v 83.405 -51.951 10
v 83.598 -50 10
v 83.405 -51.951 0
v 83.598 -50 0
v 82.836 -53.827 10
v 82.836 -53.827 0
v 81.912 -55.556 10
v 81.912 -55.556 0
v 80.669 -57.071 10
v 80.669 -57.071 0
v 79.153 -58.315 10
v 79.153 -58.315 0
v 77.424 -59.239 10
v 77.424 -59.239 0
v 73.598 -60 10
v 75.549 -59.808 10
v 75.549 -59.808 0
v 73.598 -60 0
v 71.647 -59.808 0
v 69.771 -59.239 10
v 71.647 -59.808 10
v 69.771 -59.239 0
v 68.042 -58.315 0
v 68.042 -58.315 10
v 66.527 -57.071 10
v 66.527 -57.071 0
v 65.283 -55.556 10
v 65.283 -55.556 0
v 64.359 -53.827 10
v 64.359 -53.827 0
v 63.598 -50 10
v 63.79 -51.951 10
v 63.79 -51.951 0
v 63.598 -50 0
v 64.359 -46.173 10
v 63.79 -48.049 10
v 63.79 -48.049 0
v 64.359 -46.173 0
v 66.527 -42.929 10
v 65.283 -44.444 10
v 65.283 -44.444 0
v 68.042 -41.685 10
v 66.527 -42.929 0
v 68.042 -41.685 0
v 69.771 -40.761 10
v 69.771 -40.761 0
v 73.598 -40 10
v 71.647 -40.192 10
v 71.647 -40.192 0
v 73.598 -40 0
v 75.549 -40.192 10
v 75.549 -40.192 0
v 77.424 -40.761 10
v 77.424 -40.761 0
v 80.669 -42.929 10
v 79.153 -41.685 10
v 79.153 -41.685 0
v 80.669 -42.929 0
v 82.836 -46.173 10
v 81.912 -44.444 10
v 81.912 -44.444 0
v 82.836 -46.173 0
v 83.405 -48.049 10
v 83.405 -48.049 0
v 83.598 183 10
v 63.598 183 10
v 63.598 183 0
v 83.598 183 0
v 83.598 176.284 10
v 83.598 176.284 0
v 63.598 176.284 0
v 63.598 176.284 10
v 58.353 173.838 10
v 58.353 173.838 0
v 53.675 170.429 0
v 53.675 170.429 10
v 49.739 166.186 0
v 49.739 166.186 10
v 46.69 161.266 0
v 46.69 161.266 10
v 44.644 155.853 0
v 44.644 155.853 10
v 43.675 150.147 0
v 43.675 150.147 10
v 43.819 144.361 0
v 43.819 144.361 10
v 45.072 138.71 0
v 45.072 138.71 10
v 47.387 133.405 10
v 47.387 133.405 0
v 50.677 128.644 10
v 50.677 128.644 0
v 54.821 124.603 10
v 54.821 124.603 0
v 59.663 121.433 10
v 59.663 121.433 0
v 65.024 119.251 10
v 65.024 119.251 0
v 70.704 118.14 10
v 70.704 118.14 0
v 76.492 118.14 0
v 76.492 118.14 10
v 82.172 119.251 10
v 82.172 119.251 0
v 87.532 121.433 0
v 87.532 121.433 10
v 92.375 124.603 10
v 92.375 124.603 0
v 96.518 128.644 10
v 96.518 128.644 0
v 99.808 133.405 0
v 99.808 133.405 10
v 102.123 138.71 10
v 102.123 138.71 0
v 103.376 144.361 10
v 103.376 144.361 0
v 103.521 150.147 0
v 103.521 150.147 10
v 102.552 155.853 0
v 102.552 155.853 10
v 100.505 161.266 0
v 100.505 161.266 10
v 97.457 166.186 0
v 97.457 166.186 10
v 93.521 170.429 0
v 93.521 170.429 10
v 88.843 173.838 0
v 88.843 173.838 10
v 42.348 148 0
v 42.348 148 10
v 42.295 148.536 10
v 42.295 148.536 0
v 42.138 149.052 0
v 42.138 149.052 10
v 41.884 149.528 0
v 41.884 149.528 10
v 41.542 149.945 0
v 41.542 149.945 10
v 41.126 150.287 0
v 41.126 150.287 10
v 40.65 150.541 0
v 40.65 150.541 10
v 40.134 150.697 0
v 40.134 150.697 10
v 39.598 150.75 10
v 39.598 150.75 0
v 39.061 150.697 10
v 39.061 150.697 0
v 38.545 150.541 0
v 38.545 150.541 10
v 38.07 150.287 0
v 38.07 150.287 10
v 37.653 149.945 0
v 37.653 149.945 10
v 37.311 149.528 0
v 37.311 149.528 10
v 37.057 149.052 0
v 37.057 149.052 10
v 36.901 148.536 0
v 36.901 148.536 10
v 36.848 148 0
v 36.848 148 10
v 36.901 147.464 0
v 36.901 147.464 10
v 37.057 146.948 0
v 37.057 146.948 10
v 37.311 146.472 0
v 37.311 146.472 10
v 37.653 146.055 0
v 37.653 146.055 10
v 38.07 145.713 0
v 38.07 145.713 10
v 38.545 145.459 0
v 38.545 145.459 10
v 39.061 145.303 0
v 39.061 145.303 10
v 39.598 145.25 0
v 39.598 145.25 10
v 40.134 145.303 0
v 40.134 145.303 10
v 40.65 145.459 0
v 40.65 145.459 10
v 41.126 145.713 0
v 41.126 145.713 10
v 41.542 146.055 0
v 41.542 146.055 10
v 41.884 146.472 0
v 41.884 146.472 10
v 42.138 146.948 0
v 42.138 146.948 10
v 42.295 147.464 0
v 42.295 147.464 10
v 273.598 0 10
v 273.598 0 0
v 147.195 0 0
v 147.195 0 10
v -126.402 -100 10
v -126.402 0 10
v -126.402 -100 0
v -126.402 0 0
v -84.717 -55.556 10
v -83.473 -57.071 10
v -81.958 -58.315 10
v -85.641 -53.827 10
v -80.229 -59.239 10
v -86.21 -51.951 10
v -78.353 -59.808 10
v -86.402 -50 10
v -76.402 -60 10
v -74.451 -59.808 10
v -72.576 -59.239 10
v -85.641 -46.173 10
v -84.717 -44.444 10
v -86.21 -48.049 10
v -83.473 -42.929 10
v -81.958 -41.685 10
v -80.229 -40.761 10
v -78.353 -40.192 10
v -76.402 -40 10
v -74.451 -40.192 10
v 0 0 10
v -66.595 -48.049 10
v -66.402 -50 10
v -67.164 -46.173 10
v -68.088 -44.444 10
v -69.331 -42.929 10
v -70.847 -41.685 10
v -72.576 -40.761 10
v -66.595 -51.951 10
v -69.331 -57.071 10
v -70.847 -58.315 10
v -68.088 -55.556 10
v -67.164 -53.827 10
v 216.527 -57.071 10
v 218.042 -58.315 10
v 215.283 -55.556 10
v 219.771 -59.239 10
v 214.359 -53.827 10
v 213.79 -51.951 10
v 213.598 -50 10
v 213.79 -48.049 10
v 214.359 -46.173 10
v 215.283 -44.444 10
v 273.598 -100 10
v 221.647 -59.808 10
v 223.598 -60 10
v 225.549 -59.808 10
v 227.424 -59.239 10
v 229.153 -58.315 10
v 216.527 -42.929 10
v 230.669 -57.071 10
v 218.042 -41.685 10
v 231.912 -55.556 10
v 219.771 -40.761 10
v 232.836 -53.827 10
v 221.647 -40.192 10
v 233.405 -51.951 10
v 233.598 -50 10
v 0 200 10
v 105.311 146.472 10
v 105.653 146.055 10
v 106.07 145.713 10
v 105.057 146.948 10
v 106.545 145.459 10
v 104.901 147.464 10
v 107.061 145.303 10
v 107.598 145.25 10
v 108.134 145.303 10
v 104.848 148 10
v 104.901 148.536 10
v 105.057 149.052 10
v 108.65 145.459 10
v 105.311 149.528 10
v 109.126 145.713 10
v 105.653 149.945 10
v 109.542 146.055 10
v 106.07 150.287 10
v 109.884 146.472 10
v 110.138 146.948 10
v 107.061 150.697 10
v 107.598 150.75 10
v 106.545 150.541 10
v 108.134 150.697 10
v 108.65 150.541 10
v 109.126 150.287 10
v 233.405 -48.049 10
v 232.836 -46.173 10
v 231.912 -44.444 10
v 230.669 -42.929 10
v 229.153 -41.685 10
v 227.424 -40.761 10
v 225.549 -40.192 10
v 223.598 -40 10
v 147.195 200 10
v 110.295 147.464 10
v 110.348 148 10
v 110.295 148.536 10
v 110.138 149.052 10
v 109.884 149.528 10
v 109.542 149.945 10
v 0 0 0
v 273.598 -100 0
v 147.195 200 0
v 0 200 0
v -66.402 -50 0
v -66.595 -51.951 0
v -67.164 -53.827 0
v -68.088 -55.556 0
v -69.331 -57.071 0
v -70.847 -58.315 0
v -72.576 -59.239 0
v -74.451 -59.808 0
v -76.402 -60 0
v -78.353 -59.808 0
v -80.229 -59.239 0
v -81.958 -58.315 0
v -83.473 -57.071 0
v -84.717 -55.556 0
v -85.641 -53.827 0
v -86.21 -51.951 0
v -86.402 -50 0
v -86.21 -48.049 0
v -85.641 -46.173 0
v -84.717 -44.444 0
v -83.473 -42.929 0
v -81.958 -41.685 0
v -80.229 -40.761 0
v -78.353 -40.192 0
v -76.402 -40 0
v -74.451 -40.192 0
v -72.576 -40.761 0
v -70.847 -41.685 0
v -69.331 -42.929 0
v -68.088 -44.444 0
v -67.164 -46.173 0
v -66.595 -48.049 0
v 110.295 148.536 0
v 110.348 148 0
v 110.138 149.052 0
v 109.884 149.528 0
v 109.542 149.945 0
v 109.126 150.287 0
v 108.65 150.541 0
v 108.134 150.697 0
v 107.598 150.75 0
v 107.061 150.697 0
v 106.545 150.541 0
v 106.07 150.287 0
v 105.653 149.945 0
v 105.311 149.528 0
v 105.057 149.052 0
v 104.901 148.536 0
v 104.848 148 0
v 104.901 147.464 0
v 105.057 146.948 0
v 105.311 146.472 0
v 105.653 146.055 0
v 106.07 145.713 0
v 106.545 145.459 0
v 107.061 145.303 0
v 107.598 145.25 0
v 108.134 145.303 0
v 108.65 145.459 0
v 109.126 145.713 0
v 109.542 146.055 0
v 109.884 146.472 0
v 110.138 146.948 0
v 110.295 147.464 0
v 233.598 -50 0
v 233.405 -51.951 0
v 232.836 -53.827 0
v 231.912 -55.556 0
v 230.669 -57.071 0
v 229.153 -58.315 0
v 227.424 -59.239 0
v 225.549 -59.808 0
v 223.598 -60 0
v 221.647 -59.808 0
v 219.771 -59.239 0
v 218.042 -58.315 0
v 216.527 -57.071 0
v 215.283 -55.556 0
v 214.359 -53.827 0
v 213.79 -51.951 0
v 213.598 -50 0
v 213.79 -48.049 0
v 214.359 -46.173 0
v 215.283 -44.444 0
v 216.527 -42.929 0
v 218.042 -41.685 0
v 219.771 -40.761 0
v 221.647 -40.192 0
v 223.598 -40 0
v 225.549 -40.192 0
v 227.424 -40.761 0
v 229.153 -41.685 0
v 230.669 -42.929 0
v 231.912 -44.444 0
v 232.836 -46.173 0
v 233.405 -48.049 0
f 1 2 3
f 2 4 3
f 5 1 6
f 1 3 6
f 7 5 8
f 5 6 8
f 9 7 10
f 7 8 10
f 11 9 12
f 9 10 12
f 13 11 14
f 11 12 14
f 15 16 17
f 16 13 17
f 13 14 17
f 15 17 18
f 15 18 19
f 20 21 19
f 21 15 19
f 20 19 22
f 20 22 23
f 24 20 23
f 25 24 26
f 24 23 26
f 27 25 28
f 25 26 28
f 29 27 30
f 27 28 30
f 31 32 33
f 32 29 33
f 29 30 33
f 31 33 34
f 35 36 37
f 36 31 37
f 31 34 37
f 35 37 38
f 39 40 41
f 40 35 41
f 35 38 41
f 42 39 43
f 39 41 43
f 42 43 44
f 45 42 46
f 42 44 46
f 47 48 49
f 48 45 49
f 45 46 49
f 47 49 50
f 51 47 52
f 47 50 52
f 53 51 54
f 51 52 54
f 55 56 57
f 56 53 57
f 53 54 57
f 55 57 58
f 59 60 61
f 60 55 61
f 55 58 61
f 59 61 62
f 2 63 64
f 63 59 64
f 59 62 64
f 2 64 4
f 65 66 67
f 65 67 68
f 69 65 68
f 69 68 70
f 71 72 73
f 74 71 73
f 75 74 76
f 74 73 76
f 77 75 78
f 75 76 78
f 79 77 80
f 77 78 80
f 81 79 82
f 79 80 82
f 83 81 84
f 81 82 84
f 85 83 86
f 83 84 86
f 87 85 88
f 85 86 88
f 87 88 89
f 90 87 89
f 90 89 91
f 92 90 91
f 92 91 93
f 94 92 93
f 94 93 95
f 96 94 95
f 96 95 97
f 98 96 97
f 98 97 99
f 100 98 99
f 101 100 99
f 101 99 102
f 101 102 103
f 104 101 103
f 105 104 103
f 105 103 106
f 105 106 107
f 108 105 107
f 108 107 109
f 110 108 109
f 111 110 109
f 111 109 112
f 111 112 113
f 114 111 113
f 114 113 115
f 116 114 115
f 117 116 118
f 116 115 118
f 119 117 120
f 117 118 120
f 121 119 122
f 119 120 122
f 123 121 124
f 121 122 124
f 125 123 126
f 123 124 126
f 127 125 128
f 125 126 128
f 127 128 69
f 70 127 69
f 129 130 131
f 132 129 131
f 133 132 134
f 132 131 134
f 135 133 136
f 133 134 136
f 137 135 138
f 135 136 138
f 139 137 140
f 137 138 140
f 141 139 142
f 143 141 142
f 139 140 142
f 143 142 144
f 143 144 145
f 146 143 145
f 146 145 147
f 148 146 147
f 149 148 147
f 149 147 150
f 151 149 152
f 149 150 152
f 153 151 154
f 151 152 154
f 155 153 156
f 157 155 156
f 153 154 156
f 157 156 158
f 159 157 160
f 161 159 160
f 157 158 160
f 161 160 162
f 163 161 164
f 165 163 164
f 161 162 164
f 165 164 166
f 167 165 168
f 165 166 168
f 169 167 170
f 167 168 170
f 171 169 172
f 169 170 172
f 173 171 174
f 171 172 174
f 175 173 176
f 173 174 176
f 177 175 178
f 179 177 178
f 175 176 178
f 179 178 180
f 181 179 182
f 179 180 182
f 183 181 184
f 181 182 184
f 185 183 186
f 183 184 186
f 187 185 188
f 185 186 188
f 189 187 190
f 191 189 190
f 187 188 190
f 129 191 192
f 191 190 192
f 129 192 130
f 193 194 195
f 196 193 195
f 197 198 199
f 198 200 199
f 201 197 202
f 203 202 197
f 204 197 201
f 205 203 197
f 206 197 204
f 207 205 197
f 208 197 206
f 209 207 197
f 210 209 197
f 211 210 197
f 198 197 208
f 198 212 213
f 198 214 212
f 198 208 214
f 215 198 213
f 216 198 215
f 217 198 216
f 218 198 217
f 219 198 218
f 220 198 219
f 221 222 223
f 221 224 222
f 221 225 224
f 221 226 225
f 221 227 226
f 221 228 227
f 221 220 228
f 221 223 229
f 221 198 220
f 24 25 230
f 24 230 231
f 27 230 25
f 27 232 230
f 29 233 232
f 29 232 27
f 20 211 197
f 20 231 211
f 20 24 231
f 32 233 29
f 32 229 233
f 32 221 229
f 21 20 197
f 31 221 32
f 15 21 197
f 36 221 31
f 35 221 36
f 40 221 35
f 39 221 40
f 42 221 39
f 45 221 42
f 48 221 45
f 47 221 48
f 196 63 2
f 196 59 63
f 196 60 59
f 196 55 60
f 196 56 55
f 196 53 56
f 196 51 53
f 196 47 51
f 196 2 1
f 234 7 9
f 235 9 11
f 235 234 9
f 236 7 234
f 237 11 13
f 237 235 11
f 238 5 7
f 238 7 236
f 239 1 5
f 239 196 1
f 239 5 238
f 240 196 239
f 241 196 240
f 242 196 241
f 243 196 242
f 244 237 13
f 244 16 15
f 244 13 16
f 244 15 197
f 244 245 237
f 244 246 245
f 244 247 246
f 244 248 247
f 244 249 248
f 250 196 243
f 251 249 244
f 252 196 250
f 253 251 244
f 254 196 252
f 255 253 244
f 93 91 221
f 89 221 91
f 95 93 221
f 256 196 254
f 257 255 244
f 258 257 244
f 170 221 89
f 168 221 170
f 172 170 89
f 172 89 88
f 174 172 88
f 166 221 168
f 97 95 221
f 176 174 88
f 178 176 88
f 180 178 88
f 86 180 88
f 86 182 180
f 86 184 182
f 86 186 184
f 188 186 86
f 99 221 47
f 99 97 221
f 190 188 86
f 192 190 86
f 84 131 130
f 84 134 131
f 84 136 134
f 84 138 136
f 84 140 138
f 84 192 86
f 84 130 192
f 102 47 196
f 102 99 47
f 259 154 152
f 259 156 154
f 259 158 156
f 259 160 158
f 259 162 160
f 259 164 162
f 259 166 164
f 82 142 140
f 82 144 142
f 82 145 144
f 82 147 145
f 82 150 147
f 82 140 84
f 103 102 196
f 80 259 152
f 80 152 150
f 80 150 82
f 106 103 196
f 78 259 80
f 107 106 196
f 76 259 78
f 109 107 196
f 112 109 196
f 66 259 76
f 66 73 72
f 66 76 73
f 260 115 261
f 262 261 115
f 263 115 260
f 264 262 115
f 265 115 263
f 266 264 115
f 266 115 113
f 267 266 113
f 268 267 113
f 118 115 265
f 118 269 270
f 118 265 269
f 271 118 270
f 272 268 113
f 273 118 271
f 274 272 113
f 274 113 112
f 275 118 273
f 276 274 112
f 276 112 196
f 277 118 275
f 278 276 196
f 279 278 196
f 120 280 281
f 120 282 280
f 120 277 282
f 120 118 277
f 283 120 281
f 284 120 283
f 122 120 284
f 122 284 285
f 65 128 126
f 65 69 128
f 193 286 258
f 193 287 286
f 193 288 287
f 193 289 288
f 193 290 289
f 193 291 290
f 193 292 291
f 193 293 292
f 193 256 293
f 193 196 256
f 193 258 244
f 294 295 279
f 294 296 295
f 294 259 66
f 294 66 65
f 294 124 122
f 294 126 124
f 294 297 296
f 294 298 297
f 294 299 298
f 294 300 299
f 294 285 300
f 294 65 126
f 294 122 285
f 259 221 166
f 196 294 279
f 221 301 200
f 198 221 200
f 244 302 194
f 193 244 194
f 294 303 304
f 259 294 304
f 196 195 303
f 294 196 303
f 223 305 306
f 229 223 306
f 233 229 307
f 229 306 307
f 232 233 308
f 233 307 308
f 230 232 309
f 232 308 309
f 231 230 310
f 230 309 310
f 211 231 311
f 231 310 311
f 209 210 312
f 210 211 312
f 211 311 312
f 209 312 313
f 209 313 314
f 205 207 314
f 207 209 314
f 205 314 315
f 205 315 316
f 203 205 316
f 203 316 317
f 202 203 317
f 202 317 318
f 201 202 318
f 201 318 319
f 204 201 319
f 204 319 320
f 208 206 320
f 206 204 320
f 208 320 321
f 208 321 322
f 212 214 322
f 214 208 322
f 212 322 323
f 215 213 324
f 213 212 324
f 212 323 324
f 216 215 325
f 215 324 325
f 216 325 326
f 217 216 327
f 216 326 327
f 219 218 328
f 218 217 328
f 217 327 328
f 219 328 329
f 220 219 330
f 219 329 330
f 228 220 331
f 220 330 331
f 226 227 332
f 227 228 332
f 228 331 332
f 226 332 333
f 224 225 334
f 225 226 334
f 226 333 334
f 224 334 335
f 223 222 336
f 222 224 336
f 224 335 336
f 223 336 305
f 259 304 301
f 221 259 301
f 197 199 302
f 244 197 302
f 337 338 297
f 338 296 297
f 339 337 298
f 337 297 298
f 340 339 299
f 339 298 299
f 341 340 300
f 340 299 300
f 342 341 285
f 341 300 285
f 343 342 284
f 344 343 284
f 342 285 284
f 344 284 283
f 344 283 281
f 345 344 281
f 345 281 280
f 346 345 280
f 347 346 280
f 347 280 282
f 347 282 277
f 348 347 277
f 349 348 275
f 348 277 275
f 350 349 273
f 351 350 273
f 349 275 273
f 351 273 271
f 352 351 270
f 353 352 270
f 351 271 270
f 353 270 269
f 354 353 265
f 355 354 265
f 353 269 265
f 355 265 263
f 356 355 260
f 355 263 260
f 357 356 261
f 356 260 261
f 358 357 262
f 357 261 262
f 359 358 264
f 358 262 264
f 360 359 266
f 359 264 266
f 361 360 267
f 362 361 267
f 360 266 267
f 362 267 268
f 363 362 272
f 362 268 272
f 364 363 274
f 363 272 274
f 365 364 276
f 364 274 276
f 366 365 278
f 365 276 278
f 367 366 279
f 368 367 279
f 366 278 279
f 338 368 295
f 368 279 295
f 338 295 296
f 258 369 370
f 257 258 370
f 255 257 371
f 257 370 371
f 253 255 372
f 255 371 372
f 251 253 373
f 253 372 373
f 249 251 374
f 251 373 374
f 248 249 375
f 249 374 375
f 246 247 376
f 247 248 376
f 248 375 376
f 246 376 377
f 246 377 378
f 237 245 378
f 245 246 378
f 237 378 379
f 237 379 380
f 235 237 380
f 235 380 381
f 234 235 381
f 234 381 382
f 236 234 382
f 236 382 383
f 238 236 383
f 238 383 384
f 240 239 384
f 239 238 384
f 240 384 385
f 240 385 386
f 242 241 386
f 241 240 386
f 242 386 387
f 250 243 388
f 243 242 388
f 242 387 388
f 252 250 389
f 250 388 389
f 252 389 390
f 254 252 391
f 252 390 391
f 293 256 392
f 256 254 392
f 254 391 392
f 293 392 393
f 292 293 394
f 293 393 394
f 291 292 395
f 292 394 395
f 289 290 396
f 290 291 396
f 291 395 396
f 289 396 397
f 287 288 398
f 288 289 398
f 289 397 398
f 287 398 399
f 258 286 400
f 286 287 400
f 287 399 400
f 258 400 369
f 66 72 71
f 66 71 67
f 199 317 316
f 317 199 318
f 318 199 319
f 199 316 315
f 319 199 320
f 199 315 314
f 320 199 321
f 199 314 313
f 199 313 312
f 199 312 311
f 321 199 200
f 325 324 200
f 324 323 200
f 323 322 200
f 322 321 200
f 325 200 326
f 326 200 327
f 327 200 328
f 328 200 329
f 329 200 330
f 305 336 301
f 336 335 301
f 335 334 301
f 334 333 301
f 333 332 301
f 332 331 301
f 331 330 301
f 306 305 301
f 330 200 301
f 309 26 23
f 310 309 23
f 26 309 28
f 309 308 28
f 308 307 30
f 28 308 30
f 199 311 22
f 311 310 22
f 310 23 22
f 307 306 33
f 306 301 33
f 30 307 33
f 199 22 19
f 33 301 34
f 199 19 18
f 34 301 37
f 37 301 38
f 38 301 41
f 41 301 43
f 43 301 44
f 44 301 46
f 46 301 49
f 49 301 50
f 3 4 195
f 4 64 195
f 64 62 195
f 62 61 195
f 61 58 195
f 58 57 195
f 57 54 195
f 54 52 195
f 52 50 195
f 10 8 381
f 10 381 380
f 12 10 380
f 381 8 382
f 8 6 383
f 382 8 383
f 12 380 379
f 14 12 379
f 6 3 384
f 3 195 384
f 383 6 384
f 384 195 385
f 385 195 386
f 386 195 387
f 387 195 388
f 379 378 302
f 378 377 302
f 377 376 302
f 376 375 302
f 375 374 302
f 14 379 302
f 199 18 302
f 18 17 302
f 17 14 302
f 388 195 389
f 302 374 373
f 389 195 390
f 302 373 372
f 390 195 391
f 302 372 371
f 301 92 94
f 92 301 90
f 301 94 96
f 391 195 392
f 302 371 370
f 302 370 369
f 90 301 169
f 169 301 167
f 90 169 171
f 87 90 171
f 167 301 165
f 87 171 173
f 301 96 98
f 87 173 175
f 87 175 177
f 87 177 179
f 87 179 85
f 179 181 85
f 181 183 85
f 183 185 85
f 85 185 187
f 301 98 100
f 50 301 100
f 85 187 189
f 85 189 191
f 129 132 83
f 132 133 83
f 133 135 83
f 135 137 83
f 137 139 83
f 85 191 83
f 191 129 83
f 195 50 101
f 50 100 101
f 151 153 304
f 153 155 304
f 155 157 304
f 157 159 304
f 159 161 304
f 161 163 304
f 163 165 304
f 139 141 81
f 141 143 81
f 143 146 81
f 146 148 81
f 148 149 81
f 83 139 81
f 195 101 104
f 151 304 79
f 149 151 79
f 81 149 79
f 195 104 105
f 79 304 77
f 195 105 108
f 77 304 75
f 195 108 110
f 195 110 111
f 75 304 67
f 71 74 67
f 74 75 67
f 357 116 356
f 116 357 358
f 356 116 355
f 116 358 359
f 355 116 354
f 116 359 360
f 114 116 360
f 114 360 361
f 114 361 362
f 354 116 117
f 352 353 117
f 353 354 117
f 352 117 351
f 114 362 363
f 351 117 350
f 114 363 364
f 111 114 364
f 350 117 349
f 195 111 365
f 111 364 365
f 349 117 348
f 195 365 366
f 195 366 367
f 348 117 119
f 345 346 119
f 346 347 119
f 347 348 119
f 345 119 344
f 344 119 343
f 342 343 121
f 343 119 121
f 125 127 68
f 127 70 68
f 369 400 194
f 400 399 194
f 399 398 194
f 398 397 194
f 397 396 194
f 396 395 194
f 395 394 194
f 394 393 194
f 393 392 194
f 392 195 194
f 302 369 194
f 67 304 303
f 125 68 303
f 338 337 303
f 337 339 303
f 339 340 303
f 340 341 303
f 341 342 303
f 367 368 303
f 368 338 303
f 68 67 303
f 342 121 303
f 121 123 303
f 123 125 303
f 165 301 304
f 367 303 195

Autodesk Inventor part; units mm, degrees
ref_plane "YZ Plane" through (0, 0, 0) normal (1, 0, 0) x (0, 1, 0)
ref_plane "XZ Plane" through (0, 0, 0) normal (0, 1, 0) x (-1, 0, 0)
ref_plane "XY Plane" through (0, 0, 0) normal (0, 0, 1) x (1, 0, 0)
sketch "Skizze1" plane through (0, 0, 0) normal (0, 0, 1) x (1, 0, 0)
  line L0 (147.1952, 0) -> (147.1952, 200)
  line L1 (147.1952, 200) -> (0, 200)
  line L2 (0, 200) -> (0, 0)
  line L3 (0, 0) -> (-24.1421, 0)
  line L4 (-24.1421, 0) -> (-126.4024, 0)
  line L5 (-126.4024, 0) -> (-126.4024, -100)
  line L6 (-126.4024, -100) -> (273.5976, -100)
  line L7 (273.5976, -100) -> (273.5976, 0)
  line L8 (273.5976, 0) -> (171.3373, 0)
  line L9 (171.3373, 0) -> (147.1952, 0)
  circle A0 centre (223.5976, -50) radius 10
  circle A1 centre (-76.4024, -50) radius 10
  circle A2 centre (73.5976, -50) radius 10
  dimension "d34" = 20
  dimension "d35" = 90
  dimension "d36" = 90
  dimension "d37" = 90
  dimension "d38" = 126.4024
  dimension "d39" = 273.5976
  dimension "d40" = 400
  dimension "d41" = 200
  dimension "d42" = 100
  dimension "d43" = 0
  dimension "d44" = 0
  dimension "d45" = 0
  dimension "d46" = 0
  dimension "d47" = 0
  dimension "d48" = 100
  dimension "d49" = 0
  dimension "d50" = 50
  dimension "d51" = 50
  dimension "d52" = 102.2603
  dimension "d53" = 102.2603
  dimension "d54" = 200
  dimension "d55" = 126.4024
  dimension "d56" = 0
  dimension "d57" = 126.4024
  dimension "d58" = 200
  dimension "d59" = 50
  dimension "d60" = 200
  dimension "d61" = 273.5976
  dimension "d62" = 0
  dimension "d63" = 273.5976
  dimension "d64" = 297.7397
  dimension "d65" = 297.7397
  dimension "d66" = 350
  dimension "d67" = 50
  dimension "d68" = 0
  dimension "d69" = 400
  dimension "d70" = 100
  dimension "d71" = 400
extrude "Extrusion1" add sketch "Skizze1" along normal blind 10
sketch "Skizze2" plane through (0, 0, 10) normal (0, 0, 1) x (1, 0, 0)
  arc A0 (63.5977, 176.2843) -> (83.5977, 176.2843) centre (73.5977, 148) ccw
  line L0 (147.1952, 200) -> (0, 200) projected
  line L1 (147.1952, 0) -> (147.1952, 200) projected
  line L2 (63.5977, 183) -> (83.5977, 183)
  line L3 (83.5977, 183) -> (83.5977, 176.2843)
  line L4 (63.5977, 176.2843) -> (63.5977, 183)
  circle A1 centre (39.5977, 148) radius 2.75
  circle A2 centre (107.5977, 148) radius 2.75
  point P0 (0, 0)
  dimension "d72" = 60
  dimension "d73" = 52
  dimension "d74" = 73.5975
  dimension "d75" = 35
  dimension "d76" = 20
  dimension "d77" = 83.5975
  dimension "d78" = 5.5
  dimension "d79" = 5.5
  dimension "d80" = 52
  dimension "d81" = 68
  dimension "d82" = 0
  dimension "d83" = 39.5975
extrude "Extrusion2" cut sketch "Skizze2" against normal through all
properties part number "InnenUnten"
